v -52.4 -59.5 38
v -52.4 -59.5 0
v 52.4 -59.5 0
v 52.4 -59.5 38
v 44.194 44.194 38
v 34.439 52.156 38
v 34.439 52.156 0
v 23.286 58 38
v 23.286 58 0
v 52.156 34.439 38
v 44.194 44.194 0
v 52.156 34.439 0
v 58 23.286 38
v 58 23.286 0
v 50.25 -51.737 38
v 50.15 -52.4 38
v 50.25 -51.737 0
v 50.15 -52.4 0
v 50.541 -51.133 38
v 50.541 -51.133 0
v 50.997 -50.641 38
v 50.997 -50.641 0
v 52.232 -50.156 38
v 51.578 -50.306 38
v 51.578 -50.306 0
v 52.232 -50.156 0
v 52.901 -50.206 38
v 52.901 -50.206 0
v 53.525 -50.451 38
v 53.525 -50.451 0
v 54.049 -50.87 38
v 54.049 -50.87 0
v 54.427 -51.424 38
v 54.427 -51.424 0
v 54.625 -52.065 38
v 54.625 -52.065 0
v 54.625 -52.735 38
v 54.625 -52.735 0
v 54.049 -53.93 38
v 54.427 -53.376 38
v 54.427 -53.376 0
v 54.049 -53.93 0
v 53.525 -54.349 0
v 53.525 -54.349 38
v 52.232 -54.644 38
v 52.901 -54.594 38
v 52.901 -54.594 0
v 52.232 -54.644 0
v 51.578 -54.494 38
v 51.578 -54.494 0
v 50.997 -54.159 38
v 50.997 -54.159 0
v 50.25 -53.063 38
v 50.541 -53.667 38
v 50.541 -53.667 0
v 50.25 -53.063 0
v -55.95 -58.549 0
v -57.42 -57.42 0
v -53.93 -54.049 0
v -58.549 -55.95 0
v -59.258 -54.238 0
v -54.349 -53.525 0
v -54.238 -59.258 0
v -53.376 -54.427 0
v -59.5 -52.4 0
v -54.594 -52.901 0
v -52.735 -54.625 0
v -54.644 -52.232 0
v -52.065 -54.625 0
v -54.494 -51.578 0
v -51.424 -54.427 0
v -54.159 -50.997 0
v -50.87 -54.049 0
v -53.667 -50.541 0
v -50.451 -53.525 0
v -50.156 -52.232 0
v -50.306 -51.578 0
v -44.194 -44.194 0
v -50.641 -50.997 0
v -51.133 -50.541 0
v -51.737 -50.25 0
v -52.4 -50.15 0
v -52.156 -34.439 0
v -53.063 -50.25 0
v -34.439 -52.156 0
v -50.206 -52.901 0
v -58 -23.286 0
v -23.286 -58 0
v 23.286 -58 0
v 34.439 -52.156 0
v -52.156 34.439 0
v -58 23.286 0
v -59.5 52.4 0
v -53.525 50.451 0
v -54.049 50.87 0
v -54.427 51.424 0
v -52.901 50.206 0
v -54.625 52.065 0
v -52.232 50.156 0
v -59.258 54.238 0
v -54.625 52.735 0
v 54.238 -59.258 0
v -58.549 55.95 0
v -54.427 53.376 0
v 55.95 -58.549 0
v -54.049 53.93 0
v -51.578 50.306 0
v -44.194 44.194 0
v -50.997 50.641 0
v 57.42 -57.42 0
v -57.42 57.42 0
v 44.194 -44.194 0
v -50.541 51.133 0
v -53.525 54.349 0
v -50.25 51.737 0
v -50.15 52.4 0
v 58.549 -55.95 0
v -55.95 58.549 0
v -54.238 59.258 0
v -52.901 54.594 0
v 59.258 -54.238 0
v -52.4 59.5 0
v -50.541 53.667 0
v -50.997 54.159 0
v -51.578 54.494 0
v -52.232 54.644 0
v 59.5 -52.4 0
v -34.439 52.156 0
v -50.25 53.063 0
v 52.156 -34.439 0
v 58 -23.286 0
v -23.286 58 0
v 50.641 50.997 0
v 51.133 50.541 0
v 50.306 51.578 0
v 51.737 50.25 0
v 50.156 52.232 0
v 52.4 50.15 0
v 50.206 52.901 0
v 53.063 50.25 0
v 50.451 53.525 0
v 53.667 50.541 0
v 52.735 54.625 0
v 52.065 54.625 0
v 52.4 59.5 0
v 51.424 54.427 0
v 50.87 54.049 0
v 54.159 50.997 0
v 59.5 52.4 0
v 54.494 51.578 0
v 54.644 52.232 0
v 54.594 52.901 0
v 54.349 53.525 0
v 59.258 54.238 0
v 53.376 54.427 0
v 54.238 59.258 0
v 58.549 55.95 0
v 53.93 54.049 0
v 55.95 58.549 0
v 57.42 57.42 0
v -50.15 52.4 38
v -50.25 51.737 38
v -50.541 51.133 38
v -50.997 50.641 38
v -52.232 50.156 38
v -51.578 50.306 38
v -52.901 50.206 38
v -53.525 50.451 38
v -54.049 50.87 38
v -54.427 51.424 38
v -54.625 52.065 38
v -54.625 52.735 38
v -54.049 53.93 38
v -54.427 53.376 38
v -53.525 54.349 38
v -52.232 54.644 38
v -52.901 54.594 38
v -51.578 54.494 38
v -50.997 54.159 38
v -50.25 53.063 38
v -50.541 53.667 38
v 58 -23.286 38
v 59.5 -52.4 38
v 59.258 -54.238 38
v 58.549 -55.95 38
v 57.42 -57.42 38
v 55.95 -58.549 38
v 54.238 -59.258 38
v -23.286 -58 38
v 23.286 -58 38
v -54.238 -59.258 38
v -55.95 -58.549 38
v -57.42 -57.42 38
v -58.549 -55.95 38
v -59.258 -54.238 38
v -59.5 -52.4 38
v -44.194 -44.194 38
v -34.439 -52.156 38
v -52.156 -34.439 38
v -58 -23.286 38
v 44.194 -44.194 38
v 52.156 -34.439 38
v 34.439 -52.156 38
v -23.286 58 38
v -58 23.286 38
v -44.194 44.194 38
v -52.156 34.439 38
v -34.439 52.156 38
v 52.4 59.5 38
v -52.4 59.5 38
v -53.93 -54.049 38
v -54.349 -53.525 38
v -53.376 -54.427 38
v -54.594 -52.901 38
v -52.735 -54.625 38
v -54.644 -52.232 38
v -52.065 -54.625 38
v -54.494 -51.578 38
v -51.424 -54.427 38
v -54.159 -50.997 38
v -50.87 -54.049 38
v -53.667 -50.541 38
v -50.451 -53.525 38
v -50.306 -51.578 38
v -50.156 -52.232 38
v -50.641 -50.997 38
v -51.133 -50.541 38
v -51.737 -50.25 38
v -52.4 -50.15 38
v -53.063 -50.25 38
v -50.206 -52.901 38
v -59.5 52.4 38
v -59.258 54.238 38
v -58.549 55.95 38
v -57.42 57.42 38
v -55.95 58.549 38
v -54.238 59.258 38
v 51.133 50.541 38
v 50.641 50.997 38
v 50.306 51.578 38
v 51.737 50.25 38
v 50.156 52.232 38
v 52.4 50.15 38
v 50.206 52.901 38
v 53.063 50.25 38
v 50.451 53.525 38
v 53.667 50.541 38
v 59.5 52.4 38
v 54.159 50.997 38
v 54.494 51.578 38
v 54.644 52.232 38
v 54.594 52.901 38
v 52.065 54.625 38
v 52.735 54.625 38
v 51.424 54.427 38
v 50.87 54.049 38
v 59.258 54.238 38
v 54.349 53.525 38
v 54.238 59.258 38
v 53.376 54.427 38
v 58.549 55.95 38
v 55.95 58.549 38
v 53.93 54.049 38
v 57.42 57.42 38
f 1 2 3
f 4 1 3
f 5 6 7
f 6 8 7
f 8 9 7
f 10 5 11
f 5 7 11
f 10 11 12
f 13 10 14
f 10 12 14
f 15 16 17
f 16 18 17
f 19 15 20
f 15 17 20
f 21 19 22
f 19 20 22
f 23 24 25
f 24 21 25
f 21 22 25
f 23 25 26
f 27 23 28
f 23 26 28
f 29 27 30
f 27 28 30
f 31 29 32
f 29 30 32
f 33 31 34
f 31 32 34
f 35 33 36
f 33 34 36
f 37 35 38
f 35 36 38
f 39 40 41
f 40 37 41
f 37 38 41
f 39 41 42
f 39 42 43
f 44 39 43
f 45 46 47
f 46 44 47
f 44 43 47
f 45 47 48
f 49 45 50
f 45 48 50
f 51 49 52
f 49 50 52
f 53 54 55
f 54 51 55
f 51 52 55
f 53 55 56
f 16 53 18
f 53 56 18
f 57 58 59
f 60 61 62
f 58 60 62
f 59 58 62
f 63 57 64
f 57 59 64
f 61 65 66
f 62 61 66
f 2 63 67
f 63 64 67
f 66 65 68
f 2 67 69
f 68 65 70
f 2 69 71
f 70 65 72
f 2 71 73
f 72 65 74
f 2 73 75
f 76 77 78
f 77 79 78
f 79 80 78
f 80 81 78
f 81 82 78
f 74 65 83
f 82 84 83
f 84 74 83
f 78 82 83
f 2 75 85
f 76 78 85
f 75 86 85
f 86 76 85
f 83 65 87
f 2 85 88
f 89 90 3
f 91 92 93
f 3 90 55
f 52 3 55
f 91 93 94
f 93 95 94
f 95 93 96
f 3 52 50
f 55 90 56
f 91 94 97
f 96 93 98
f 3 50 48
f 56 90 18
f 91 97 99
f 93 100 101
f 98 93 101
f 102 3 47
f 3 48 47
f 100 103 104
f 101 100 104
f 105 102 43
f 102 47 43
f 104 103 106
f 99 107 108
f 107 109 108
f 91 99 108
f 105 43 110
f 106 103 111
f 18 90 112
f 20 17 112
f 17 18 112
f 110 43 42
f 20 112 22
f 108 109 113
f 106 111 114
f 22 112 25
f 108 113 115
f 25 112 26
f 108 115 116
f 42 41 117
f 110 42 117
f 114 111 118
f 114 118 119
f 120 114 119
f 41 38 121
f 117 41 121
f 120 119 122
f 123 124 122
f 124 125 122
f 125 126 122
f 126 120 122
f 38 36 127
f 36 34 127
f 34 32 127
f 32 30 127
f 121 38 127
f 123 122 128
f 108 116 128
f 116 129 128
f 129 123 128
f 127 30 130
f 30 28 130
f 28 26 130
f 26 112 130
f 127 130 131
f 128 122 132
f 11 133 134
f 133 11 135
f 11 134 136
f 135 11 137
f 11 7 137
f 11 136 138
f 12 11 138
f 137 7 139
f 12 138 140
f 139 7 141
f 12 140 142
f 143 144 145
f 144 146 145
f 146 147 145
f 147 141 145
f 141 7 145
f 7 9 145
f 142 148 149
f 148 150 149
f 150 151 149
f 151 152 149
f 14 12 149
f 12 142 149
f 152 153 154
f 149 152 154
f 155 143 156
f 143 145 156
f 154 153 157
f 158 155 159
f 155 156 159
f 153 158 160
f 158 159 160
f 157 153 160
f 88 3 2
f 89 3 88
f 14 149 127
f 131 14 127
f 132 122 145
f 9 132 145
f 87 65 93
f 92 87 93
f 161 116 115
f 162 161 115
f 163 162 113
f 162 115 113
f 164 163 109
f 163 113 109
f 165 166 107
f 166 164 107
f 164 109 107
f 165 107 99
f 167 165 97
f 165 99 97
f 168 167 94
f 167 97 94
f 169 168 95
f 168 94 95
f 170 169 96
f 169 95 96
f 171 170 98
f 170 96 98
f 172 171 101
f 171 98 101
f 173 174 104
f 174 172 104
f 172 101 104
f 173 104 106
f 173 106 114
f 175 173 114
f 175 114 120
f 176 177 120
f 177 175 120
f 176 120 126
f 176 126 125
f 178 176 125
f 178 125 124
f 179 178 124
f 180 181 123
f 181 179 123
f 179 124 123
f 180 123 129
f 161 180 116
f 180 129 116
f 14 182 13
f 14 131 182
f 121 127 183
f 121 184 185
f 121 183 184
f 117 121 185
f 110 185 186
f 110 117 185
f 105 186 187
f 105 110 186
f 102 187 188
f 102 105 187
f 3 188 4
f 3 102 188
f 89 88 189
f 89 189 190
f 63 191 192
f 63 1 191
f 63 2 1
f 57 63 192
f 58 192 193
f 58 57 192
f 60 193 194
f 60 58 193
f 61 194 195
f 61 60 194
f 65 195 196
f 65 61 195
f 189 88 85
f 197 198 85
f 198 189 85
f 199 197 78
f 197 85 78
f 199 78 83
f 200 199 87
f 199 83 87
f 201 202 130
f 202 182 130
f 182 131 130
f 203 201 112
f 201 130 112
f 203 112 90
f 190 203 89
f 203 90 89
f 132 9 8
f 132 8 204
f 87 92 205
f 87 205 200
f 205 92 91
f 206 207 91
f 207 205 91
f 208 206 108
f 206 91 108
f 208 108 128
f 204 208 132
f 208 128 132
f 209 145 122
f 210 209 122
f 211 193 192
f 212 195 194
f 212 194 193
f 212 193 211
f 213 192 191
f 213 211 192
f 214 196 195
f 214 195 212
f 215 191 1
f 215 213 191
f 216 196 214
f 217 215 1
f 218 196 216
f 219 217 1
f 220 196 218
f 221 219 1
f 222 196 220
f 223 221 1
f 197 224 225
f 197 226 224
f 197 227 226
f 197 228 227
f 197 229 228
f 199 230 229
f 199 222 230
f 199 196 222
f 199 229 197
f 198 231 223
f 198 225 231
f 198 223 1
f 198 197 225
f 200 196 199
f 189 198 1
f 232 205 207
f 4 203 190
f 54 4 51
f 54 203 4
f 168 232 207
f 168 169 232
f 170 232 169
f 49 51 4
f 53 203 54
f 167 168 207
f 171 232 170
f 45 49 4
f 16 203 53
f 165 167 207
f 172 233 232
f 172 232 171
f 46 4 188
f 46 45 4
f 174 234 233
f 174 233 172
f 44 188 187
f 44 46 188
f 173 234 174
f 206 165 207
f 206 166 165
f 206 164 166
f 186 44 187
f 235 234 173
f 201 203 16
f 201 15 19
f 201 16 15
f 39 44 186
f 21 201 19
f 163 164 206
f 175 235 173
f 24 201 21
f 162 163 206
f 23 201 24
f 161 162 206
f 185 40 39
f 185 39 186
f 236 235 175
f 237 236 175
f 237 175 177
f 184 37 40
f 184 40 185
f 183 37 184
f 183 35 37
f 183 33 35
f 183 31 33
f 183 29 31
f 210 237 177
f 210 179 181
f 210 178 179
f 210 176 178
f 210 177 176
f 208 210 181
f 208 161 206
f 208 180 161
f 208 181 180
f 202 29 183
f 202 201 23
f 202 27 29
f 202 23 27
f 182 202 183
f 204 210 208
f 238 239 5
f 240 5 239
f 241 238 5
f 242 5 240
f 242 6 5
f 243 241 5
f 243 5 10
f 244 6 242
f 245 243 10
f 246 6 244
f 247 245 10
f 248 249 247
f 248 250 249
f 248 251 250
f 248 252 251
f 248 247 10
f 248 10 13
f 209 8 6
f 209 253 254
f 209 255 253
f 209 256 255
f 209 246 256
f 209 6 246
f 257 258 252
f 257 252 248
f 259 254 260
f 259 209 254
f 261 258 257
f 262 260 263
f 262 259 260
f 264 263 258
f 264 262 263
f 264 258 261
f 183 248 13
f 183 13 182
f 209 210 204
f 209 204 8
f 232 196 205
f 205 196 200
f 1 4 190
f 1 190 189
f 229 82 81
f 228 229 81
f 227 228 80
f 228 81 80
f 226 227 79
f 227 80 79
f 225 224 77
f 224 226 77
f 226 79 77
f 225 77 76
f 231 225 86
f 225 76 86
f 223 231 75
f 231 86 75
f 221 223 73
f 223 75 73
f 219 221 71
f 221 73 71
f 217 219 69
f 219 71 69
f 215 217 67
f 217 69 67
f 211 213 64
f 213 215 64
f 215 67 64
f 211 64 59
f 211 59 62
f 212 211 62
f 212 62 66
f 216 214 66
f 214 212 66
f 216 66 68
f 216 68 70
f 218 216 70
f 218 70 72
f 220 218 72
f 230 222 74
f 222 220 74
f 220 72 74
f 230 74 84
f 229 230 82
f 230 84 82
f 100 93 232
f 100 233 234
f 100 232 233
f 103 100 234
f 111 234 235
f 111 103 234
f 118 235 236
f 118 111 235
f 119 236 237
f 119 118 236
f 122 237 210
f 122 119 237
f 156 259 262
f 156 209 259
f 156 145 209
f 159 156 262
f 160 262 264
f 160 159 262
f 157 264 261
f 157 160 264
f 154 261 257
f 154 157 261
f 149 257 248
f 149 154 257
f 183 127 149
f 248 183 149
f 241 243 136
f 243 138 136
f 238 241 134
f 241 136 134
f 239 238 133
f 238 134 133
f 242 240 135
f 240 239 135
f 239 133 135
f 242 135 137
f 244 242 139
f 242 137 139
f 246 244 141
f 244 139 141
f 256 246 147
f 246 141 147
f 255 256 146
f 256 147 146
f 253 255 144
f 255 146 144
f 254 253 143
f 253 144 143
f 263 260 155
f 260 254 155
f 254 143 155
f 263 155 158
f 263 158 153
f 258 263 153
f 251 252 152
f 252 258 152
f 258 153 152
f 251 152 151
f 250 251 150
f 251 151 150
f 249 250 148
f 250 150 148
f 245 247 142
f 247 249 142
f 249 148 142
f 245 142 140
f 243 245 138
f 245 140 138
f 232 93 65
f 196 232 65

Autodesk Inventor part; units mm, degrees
ref_plane "YZ Plane" through (0, 0, 0) normal (1, 0, 0) x (0, 1, 0)
ref_plane "XZ Plane" through (0, 0, 0) normal (0, 1, 0) x (-1, 0, 0)
ref_plane "XY Plane" through (0, 0, 0) normal (0, 0, 1) x (1, 0, 0)
sketch "Sketch1" plane through (0, 0, 0) normal (0, 0, 1) x (1, 0, 0)
  line L0 (-59.5, -59.5) -> (59.5, -59.5)
  line L1 (59.5, -59.5) -> (59.5, 59.5)
  line L2 (59.5, 59.5) -> (-59.5, 59.5)
  line L3 (-59.5, 59.5) -> (-59.5, -59.5)
  line L4 (-59.5, -59.5) -> (59.5, 59.5) construction
  line L5 (59.5, -59.5) -> (-59.5, 59.5) construction
  circle A0 centre (-52.4, 52.4) radius 2.25
  circle A1 centre (52.4, 52.4) radius 2.25
  line L6 (-23.2863, -58) -> (23.2863, -58)
  line L7 (58, -23.2863) -> (58, 23.2863)
  line L8 (23.2863, 58) -> (-23.2863, 58)
  line L9 (-58, 23.2863) -> (-58, -23.2863)
  line L10 (-58, -58) -> (58, 58) construction
  line L11 (58, -58) -> (-58, 58) construction
  arc A2 (-58, -23.2863) -> (-23.2863, -58) centre (0, 0) ccw
  arc A3 (23.2863, -58) -> (58, -23.2863) centre (0, 0) ccw
  arc A4 (58, 23.2863) -> (23.2863, 58) centre (0, 0) ccw
  arc A5 (-23.2863, 58) -> (-58, 23.2863) centre (0, 0) ccw
  arc A6 (-52.4, 59.5) -> (-59.5, 52.4) centre (-52.4, 52.4) ccw
  dimension "d0" = 119
  dimension "d2" = 4.5
  dimension "d3" = 104.8
  dimension "d5" = 116
  dimension "d6" = 62.5
  dimension "d7" = 46.5725
  dimension "d15" = 1.5
extrude "Extrusion1" add sketch "Sketch1" along normal blind 38 contours L3 A6 L2 L1 L0 | L3 L2 A6 | A0 | A1
extrude "Extrusion2" cut sketch "Sketch1" along normal blind 38 contours L3 L2 A6 | A0
pattern_circular "Circular Pattern1" count 4 over 360 about axis through (0, 0, 0) along (0, 0, 1) of "Extrusion2"
equation "\"d0\" = length"
equation "\"d2\" = holeSize"
equation "\"d3\" = dHoles"
equation "\"d5\" = fanCutOff"
equation "\"d6\" = 0.5 * fanDia"
equation "\"d8\" = heigth"
equation "\"d10\" = heigth"
equation "\"length\" = 119"
equation "\"width\" = length"
equation "\"heigth\" = 38"
equation "\"dHoles\" = 104.8"
equation "\"holeSize\" = 4.5"
equation "\"fanDia\" = 125"
equation "\"fanCutOff\" = 116"
equation "\"d4\" = fanDia"
properties part number "120mm Fan"
